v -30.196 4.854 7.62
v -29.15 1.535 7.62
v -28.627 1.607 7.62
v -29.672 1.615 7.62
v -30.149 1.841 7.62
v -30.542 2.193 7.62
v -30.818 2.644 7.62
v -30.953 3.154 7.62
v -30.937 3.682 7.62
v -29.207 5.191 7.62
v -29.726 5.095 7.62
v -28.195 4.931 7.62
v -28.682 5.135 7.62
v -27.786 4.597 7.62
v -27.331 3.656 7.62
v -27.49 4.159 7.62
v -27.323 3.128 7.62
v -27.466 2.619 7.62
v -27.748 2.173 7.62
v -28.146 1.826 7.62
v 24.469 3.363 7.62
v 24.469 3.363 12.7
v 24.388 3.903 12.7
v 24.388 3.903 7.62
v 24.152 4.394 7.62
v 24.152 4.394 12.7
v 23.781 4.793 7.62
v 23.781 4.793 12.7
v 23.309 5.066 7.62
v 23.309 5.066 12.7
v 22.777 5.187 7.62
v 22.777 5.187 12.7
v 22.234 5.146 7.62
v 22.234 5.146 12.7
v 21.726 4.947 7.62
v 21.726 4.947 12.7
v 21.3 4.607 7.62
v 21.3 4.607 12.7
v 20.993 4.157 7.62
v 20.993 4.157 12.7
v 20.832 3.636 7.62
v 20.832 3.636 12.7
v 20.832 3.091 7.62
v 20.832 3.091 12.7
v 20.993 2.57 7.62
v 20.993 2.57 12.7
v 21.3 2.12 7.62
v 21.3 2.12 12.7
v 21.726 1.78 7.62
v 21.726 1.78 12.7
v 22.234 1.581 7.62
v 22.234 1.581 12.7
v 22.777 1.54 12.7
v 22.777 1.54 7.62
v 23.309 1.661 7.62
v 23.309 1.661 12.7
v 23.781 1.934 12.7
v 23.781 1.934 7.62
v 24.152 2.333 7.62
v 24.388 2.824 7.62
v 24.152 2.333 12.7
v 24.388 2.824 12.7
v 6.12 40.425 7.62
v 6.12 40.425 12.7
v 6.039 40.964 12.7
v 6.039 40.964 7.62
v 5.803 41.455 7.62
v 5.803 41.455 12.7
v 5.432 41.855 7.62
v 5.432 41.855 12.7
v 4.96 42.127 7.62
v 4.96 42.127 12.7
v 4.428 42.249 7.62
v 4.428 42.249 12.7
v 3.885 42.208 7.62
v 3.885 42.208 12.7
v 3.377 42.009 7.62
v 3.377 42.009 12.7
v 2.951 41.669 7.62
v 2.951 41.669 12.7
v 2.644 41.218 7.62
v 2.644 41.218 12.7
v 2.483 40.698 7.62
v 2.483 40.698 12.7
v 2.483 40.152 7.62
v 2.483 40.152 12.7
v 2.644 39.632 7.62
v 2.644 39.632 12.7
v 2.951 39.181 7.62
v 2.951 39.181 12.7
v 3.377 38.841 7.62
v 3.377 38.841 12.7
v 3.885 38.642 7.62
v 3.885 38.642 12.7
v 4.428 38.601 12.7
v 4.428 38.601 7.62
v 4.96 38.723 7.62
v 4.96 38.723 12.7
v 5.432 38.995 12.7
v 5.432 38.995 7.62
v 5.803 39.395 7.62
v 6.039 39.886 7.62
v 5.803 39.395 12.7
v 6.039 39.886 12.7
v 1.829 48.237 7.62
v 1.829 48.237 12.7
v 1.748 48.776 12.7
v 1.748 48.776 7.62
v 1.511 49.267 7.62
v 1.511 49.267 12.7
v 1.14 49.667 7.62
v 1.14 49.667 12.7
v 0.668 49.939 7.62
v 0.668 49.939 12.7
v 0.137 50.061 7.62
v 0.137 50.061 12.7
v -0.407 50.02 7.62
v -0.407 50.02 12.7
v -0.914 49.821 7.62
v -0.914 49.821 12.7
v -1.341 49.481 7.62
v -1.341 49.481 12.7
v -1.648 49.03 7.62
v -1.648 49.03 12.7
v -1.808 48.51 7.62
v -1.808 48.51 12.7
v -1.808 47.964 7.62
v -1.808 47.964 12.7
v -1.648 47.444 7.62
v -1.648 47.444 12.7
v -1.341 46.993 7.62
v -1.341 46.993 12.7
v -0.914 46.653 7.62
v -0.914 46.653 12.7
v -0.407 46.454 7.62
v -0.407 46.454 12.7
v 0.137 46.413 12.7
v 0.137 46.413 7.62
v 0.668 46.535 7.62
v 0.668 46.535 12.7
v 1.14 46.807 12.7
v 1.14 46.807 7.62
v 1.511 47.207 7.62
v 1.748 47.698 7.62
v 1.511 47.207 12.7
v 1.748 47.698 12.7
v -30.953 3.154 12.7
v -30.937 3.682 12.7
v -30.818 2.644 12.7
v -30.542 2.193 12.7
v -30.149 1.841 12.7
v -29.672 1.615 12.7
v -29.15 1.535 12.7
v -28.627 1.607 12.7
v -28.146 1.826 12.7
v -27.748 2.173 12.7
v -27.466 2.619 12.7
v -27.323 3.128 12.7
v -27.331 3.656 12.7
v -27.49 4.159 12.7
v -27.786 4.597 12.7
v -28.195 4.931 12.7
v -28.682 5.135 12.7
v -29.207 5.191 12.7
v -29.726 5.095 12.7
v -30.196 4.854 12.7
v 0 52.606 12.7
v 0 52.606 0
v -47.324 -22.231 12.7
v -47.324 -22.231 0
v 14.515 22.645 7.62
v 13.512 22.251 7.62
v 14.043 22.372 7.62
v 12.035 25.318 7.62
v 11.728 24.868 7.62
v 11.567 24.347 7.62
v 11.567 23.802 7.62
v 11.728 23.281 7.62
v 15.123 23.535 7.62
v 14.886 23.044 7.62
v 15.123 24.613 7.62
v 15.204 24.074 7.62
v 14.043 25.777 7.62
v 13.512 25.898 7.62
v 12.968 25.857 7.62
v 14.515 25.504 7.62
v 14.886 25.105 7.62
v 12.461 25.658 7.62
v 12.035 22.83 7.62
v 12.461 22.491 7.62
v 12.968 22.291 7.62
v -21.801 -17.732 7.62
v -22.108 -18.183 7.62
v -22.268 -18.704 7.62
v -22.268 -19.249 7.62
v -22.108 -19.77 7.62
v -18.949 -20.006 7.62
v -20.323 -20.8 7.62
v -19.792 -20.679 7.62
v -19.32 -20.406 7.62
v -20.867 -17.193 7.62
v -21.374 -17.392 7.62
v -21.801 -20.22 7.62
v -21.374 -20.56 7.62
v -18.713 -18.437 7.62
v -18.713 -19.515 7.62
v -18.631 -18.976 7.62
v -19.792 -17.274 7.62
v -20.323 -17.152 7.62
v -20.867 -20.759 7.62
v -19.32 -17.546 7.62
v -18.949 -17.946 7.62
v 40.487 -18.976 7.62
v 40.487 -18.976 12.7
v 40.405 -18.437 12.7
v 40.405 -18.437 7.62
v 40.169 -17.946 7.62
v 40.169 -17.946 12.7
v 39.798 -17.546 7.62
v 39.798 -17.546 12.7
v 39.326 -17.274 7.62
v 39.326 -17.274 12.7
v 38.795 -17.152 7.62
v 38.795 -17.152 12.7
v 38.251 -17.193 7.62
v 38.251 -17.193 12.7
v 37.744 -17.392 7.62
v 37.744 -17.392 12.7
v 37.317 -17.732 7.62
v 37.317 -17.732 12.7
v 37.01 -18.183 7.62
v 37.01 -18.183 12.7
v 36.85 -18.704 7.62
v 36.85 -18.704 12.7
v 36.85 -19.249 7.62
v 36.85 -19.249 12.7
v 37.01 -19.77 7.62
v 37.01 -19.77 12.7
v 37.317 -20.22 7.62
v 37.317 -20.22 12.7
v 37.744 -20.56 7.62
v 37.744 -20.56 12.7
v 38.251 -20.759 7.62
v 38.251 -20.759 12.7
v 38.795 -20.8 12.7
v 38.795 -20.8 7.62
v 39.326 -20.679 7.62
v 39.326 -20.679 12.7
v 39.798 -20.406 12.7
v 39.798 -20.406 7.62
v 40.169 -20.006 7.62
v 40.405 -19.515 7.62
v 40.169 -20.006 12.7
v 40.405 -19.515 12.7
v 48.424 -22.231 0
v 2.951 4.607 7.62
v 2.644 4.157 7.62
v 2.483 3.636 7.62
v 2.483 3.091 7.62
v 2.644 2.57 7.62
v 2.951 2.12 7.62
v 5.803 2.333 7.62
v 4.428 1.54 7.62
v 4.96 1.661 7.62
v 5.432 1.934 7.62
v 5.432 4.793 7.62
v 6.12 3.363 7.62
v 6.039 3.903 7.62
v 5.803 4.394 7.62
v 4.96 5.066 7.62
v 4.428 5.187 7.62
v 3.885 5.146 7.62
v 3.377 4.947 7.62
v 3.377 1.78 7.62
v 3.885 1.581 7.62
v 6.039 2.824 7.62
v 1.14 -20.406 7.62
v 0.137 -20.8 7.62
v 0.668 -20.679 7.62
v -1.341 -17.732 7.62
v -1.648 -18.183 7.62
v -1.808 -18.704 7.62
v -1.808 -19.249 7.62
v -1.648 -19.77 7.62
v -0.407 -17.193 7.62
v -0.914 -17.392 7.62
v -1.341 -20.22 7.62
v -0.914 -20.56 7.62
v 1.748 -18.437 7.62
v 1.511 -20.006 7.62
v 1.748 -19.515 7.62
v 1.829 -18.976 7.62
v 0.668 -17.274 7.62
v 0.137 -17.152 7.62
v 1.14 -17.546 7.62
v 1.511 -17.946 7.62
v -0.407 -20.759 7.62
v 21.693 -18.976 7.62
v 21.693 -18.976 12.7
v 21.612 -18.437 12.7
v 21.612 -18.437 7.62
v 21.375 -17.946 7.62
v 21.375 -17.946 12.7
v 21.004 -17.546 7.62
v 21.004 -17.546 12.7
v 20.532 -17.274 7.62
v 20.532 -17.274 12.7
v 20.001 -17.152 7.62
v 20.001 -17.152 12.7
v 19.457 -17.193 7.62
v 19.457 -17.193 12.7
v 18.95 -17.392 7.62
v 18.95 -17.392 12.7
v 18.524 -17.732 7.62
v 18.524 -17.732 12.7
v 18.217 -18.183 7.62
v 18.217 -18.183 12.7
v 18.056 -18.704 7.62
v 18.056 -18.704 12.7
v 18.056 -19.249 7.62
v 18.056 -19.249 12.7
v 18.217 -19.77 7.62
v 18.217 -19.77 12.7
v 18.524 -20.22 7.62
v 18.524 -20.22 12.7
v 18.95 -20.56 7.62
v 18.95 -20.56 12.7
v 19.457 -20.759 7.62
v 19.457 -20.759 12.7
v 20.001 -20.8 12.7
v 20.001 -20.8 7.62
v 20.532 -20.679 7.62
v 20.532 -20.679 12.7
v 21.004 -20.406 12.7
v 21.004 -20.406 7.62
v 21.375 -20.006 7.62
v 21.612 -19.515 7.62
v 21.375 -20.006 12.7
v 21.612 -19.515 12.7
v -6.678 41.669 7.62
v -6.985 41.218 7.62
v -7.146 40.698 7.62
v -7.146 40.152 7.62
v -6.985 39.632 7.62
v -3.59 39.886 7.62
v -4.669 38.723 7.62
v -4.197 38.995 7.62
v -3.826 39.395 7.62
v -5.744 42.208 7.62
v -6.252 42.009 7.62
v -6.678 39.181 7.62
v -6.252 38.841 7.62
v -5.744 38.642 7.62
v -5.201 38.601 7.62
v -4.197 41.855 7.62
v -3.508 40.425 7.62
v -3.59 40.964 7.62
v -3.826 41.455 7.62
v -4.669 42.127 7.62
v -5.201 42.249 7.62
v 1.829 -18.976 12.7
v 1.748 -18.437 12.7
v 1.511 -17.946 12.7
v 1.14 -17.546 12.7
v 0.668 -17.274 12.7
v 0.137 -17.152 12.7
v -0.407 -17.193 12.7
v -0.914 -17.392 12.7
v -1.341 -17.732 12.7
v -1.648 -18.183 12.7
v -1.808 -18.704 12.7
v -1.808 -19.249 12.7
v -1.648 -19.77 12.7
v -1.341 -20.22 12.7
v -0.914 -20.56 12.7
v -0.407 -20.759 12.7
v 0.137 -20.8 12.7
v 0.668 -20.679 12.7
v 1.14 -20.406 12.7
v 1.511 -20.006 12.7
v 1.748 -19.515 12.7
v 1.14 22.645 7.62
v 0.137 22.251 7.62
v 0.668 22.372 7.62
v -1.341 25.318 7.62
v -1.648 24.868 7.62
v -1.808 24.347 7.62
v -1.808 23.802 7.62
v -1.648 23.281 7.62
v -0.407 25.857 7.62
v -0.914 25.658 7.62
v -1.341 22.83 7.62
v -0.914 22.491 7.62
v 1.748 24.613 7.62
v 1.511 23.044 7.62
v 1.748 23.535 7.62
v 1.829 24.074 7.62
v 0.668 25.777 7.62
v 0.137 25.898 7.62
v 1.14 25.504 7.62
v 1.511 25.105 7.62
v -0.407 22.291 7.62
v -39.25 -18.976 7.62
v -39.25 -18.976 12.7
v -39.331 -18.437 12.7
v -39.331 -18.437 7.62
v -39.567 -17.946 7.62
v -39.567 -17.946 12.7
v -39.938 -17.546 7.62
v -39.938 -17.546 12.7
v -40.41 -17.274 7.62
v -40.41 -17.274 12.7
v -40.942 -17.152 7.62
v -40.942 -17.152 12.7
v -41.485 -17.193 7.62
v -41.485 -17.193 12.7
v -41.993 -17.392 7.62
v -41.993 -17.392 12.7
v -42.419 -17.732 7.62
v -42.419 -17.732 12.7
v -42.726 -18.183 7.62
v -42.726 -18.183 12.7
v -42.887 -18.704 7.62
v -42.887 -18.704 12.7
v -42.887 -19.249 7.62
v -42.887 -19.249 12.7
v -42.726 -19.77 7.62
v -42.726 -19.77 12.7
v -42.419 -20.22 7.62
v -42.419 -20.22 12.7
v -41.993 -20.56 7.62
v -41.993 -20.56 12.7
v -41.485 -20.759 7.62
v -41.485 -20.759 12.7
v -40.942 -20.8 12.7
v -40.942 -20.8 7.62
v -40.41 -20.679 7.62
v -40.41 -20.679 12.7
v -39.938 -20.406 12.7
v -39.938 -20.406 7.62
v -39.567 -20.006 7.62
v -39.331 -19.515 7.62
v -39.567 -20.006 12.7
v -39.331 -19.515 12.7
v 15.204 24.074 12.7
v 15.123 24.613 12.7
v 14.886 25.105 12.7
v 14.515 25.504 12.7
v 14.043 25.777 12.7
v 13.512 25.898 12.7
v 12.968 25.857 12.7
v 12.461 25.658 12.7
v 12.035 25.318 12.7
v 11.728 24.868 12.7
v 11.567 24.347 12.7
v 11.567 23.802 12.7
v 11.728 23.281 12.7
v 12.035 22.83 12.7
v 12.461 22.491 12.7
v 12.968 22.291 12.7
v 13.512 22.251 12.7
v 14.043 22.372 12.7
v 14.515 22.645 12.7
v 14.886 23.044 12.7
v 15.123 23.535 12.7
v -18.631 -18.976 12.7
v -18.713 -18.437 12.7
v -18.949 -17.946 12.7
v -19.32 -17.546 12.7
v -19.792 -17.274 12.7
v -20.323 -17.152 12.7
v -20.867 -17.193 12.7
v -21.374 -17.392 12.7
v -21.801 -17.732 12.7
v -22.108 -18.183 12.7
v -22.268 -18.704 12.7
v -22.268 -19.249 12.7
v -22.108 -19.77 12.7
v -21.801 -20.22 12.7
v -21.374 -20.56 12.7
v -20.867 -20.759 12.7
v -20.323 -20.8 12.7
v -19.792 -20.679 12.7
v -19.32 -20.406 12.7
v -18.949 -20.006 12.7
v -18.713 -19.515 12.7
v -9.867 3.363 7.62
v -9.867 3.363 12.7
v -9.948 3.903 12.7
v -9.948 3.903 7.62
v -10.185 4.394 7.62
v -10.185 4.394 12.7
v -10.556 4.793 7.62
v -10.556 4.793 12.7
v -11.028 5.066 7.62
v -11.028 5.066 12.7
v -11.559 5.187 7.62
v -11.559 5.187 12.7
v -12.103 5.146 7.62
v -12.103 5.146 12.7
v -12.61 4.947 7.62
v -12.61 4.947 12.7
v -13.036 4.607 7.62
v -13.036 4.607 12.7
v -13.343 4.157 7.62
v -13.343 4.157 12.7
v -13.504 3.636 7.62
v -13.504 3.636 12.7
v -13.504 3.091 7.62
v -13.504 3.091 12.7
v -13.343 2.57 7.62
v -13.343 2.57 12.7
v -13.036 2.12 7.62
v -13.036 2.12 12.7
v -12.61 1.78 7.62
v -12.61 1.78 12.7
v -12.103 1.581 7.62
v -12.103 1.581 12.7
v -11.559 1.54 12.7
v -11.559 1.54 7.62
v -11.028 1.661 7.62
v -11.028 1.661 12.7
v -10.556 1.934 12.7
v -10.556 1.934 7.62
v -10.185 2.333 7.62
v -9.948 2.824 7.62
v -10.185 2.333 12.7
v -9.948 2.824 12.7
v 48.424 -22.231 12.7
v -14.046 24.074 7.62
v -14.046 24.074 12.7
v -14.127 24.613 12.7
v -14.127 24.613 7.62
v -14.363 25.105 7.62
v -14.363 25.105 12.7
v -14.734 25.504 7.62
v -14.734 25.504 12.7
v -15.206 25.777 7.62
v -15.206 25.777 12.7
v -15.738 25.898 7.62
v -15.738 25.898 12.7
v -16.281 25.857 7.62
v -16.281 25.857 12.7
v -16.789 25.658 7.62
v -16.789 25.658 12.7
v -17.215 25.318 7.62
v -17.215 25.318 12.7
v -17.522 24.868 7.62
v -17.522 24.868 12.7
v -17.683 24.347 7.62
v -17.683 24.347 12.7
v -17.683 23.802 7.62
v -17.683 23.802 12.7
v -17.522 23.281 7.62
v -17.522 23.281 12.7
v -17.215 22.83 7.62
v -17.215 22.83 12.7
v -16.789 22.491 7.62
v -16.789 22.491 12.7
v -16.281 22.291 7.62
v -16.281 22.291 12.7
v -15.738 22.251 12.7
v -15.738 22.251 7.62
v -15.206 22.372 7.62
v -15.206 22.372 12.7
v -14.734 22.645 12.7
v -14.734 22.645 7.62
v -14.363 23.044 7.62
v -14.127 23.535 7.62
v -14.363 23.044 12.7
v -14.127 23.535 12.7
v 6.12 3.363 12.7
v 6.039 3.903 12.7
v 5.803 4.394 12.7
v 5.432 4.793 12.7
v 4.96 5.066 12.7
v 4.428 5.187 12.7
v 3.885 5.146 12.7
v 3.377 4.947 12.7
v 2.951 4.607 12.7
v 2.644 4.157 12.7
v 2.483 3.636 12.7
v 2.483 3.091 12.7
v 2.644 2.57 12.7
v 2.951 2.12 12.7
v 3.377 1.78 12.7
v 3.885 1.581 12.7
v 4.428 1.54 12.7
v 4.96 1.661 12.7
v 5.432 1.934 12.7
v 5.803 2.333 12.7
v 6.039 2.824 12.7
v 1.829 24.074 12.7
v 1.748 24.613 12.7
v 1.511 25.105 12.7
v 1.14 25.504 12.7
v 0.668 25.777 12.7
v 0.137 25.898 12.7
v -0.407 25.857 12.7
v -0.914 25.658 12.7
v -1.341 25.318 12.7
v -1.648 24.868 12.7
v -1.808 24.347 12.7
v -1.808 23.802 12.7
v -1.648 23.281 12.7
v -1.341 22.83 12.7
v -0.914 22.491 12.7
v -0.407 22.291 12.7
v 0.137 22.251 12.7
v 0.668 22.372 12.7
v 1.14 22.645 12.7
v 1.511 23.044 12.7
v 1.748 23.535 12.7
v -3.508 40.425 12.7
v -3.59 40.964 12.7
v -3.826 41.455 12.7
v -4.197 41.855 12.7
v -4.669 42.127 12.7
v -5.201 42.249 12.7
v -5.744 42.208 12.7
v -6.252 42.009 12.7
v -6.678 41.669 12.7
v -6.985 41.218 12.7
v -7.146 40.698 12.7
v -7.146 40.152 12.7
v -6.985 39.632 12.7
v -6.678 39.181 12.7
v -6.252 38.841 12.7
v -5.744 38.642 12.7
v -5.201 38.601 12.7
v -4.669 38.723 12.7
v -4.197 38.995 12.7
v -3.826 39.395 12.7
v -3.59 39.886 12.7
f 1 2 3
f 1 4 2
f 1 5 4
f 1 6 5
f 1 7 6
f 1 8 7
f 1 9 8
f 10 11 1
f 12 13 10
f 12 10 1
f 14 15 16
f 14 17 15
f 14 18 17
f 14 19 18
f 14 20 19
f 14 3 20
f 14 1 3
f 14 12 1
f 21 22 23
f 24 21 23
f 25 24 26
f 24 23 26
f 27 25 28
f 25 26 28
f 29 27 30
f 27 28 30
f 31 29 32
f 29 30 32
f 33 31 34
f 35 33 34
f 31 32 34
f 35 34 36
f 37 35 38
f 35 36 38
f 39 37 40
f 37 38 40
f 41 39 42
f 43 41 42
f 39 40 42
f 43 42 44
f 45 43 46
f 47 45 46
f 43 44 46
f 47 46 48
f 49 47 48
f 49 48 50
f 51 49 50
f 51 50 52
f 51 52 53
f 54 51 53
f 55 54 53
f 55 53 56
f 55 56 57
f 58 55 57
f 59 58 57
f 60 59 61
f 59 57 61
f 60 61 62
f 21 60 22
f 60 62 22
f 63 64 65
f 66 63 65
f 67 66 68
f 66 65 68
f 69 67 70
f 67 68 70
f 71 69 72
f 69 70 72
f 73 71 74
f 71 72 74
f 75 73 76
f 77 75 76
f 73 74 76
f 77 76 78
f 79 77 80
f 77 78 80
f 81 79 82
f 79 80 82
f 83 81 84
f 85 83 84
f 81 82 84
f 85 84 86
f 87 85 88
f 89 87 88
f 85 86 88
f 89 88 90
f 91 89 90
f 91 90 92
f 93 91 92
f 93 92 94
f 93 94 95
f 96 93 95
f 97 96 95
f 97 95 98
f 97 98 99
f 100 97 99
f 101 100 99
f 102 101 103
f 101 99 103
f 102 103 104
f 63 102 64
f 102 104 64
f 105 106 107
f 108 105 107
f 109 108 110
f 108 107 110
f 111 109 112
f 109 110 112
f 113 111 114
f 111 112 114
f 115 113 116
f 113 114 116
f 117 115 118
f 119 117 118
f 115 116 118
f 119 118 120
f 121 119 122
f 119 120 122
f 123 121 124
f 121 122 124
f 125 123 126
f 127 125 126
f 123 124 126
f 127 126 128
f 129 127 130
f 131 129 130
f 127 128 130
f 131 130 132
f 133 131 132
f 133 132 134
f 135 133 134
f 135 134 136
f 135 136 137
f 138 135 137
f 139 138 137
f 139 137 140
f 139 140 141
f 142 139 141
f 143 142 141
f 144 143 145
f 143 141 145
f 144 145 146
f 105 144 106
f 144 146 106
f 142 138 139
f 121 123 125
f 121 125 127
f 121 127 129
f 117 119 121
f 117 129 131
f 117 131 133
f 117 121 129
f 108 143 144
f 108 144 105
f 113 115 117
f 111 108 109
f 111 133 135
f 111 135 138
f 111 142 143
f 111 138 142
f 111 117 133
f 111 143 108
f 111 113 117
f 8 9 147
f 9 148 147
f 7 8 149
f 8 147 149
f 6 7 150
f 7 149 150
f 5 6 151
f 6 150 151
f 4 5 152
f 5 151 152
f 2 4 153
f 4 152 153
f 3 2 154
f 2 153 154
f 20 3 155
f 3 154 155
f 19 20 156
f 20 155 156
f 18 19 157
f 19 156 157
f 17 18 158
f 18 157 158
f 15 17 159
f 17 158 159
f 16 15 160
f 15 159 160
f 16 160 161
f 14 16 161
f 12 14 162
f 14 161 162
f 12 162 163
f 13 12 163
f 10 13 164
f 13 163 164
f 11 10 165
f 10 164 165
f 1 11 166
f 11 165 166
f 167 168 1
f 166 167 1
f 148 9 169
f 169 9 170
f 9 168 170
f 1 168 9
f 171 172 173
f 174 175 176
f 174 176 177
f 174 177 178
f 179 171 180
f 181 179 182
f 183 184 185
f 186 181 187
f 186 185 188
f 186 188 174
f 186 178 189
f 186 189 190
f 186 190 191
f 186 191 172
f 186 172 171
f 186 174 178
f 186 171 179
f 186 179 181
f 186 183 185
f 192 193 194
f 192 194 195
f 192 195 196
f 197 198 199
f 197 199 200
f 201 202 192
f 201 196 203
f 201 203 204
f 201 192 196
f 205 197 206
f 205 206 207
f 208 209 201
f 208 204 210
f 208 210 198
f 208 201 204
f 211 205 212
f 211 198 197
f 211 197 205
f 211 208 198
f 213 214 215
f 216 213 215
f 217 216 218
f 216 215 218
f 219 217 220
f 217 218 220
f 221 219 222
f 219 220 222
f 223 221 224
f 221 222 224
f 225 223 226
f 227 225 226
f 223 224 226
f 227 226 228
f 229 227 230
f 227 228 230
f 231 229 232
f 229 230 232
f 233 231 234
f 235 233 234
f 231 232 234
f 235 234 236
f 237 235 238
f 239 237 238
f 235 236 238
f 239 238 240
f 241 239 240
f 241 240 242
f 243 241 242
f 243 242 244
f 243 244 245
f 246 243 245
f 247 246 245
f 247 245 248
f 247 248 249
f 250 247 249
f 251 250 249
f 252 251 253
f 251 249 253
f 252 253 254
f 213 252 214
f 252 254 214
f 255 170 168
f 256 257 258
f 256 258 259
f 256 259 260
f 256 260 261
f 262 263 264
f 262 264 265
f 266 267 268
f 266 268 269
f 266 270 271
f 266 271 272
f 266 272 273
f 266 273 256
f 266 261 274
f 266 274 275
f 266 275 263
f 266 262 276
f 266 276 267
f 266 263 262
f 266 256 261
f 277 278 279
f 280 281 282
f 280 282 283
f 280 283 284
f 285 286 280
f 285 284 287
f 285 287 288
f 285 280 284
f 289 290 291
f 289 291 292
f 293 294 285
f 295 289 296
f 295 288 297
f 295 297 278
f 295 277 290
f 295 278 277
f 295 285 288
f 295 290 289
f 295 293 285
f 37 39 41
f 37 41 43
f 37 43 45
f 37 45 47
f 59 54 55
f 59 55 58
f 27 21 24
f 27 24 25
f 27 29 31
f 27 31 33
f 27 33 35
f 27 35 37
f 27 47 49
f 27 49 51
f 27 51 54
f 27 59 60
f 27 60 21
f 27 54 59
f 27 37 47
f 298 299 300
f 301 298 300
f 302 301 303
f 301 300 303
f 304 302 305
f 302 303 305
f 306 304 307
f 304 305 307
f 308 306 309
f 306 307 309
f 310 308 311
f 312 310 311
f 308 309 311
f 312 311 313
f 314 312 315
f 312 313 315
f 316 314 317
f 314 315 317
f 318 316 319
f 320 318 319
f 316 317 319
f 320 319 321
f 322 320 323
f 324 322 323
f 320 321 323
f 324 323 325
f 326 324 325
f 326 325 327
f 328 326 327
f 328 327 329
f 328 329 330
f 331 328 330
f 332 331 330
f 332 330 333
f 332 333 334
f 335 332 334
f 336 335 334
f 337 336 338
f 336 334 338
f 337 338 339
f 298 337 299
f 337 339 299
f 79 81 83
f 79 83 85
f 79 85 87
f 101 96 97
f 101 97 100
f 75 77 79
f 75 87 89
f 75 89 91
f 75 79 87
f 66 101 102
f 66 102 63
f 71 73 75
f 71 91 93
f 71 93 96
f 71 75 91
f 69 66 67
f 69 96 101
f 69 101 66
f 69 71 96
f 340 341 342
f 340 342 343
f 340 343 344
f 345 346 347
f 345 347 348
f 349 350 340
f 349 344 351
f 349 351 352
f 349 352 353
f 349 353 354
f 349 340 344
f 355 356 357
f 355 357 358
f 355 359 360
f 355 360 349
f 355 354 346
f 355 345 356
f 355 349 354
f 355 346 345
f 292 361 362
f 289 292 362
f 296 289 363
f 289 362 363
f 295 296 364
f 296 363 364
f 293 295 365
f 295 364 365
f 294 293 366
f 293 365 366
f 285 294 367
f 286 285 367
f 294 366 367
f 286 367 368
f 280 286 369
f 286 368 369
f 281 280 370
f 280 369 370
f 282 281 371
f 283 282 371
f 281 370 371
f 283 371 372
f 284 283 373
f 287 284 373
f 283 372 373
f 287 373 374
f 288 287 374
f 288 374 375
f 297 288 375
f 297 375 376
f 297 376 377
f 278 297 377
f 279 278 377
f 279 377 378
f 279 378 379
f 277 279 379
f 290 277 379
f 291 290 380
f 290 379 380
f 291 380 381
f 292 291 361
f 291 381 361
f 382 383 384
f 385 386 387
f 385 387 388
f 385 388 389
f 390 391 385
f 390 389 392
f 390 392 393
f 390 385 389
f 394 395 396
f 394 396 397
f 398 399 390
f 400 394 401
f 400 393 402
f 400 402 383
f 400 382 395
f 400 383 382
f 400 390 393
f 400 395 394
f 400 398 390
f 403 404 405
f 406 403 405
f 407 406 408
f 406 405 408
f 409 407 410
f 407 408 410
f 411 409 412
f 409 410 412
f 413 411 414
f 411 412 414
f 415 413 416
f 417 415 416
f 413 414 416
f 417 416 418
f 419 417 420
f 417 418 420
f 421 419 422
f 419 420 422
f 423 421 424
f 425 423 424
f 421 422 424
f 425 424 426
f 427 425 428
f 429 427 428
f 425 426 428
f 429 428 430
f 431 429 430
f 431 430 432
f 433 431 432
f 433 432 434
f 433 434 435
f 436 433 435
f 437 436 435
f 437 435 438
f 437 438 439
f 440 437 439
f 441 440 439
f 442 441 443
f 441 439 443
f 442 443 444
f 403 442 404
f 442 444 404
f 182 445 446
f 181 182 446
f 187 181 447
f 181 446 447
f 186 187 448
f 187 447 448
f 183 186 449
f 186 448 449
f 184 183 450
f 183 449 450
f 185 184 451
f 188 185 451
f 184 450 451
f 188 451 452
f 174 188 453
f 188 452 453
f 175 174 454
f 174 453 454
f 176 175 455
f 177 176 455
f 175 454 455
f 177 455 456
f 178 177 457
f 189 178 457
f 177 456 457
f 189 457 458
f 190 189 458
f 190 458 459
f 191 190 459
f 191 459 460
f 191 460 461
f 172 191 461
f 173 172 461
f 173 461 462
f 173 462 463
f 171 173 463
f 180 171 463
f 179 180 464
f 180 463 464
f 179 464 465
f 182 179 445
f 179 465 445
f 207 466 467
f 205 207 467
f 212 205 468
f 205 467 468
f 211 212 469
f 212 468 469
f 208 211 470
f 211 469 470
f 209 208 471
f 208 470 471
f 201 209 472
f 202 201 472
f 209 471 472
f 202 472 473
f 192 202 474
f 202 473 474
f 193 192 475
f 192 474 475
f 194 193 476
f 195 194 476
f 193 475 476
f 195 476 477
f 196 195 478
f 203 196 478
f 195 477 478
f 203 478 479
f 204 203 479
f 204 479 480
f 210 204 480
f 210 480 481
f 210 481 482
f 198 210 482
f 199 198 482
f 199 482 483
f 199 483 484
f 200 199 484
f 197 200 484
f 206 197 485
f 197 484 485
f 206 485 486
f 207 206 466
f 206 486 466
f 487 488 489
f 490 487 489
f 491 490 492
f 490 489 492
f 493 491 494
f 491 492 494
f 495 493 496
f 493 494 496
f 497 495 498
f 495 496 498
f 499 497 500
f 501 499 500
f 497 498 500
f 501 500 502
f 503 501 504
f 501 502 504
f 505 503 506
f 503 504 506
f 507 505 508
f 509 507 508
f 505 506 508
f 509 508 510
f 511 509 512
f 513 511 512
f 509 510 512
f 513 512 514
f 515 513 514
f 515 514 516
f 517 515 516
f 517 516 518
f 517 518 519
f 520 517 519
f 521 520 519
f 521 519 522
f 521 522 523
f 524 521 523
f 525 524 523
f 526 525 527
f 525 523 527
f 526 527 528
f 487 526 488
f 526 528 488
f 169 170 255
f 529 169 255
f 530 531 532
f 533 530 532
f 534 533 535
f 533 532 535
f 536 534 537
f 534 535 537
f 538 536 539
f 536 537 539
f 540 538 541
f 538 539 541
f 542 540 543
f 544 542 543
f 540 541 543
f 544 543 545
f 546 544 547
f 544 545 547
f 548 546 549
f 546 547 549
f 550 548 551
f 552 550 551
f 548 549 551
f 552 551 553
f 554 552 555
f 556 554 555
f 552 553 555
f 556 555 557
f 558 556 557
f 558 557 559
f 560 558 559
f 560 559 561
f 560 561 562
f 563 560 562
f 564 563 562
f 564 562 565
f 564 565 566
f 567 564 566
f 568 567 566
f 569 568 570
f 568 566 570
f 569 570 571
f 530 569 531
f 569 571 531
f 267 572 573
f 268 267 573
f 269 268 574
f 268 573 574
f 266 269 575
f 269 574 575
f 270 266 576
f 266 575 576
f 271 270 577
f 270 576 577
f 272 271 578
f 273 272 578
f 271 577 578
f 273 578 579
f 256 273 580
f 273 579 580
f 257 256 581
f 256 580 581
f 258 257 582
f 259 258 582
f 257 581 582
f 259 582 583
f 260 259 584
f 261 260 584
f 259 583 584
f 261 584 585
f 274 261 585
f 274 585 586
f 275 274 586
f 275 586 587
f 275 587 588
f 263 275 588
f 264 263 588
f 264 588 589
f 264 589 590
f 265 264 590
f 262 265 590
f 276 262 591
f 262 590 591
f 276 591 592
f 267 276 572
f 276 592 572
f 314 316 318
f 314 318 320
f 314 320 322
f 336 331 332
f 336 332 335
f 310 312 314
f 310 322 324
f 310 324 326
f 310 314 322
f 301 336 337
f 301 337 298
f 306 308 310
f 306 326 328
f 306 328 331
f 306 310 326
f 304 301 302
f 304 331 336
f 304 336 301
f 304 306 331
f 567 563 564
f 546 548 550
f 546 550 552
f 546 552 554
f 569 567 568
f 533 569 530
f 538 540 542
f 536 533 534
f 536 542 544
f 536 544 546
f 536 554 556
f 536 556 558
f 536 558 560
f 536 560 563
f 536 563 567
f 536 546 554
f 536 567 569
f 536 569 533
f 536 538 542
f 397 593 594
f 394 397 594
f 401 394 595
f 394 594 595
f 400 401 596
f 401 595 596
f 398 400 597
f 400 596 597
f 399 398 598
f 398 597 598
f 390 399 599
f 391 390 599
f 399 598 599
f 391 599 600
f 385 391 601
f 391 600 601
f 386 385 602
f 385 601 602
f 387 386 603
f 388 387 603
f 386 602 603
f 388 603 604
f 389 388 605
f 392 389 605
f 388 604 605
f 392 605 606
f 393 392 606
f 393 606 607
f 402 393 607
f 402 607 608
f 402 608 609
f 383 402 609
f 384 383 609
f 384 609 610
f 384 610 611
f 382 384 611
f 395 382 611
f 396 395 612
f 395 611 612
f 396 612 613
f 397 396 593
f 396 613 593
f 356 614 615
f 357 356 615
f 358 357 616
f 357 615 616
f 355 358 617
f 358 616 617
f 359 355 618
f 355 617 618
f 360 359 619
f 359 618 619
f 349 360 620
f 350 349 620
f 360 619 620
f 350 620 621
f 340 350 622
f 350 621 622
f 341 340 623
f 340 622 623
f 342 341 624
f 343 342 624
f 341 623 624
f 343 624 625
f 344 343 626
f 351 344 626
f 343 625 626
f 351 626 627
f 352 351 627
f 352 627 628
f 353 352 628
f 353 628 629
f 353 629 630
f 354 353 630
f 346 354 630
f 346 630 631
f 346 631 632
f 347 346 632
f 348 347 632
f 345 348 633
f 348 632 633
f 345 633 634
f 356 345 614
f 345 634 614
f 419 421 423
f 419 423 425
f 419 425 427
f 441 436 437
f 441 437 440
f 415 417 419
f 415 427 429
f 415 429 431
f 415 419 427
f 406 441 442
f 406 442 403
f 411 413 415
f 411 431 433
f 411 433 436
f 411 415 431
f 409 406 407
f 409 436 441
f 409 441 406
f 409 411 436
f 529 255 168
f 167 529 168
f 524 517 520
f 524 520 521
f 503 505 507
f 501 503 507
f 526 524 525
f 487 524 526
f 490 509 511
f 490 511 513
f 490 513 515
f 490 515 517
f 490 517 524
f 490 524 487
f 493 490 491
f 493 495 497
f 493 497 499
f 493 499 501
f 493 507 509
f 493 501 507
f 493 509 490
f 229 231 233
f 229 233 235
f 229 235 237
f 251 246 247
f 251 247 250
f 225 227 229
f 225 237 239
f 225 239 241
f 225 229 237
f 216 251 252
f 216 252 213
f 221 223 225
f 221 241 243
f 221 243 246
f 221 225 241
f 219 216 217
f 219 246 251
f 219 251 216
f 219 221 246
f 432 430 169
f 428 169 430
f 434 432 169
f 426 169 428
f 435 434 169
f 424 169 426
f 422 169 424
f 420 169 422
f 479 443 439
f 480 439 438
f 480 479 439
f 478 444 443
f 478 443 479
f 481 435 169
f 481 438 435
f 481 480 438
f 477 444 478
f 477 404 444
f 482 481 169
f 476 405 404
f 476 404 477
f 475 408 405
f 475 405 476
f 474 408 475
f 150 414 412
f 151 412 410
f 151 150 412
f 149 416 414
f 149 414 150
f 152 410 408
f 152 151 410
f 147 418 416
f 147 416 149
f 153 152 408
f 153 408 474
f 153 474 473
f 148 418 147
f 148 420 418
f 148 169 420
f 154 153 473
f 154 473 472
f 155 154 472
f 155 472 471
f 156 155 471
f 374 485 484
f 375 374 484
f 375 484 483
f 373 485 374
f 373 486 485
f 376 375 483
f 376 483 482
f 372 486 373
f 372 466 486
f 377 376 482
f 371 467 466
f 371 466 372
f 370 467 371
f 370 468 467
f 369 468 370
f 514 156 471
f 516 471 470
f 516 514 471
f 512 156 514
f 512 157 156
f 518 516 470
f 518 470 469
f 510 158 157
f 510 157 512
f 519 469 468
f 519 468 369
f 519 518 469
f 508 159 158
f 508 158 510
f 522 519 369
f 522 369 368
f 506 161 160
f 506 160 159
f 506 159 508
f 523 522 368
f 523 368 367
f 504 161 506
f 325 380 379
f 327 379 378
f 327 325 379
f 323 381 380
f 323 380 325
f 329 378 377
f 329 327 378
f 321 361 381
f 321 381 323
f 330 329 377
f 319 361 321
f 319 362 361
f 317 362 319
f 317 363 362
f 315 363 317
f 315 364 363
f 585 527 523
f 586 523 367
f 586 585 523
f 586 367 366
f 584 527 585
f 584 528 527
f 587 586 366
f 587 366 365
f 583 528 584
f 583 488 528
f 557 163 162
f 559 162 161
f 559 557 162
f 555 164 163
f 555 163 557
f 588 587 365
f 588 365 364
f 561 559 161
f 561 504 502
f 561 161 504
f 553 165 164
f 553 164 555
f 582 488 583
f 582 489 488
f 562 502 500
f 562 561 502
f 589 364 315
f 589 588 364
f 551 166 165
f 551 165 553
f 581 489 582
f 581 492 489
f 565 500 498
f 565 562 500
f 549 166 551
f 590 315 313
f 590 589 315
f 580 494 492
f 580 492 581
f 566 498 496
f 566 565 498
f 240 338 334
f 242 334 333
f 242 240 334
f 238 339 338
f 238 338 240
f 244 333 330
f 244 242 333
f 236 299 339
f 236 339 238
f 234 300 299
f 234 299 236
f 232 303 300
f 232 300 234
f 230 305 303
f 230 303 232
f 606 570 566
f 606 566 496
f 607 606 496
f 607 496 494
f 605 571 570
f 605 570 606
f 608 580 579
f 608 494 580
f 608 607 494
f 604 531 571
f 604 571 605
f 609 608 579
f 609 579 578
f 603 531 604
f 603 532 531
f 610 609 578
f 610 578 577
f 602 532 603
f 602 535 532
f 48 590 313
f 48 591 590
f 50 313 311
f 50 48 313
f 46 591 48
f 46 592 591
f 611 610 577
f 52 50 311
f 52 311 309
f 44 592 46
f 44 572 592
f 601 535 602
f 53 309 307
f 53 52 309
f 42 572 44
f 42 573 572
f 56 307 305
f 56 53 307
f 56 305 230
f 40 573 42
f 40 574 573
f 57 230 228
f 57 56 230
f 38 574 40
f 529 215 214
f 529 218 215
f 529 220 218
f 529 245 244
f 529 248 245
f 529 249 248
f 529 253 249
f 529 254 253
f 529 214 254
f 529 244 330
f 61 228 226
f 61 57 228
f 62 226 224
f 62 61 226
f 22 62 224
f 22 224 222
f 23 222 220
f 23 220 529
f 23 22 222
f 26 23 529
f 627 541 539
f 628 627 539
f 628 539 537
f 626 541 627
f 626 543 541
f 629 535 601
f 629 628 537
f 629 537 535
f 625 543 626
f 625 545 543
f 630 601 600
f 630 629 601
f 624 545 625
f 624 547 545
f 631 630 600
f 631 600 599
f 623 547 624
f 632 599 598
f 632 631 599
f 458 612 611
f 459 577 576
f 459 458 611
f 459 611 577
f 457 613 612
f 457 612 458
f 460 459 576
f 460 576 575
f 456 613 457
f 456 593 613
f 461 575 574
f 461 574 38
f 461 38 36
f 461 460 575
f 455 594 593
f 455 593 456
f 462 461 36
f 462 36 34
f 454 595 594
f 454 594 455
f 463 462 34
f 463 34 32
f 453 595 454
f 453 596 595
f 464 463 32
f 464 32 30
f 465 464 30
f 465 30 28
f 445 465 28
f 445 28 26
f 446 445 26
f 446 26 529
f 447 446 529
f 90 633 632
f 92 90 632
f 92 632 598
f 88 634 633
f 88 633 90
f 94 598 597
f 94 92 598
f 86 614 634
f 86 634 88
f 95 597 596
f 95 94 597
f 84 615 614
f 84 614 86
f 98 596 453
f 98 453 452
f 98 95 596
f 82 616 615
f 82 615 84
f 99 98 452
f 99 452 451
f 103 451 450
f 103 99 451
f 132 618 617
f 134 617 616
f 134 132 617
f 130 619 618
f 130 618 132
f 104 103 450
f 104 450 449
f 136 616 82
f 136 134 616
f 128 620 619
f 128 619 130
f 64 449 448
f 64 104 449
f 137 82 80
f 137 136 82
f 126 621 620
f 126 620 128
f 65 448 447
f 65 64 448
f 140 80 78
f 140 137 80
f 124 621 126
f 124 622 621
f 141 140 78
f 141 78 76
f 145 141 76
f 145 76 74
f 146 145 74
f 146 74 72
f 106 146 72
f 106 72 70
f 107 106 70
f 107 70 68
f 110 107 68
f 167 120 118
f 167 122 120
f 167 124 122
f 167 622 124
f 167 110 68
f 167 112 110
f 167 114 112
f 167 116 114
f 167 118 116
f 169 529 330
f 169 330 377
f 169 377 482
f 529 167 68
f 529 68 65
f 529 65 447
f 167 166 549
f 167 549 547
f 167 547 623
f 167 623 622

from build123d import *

# Parameters (mm, degrees)
F1_DEPTH = 12.7
F2_R     = 1.8288
F3_DEPTH = 5.08


# Not quite as in the source:
# - the program builds the solid bodies; features that only make, move or delete a surface that nothing else refers to are left out


with BuildPart() as f1:
    # F0 (on Top) → F1 (new body)
    with BuildSketch(Plane.XY):
        Polygon((48.4242066741, -22.2311150283), (0, 52.6062995195), (-47.3236590624, -22.2311150283), align=None)
    extrude(amount=F1_DEPTH)

    # F2 (on face) → F3 (cut)
    with BuildSketch(Plane.XY.offset(12.7)):
        with Locations((-41.0783812404, -18.9761463553)):
            Circle(F2_R)
        with Locations((-20.4600691795, -18.9761463553)):
            Circle(F2_R)
        with Locations((0, -18.9761463553)):
            Circle(F2_R)
        with Locations((19.8642425239, -18.9761463553)):
            Circle(F2_R)
        with Locations((38.6579222977, -18.9761463553)):
            Circle(F2_R)
        with Locations((-29.1365217417, 3.3634696156)):
            Circle(F2_R)
        with Locations((-11.6957994178, 3.3634696156)):
            Circle(F2_R)
        with Locations((4.2915293016, 3.3634696156)):
            Circle(F2_R)
        with Locations((22.6406212896, 3.3634696156)):
            Circle(F2_R)
        with Locations((-15.87430574, 24.0743272007)):
            Circle(F2_R)
        with Locations((0, 24.0743272007)):
            Circle(F2_R)
        with Locations((13.3752385154, 24.0743272007)):
            Circle(F2_R)
        with Locations((-5.3372029215, 40.4250063002)):
            Circle(F2_R)
        with Locations((4.2915293016, 40.4250063002)):
            Circle(F2_R)
        with Locations((0, 48.2369959354)):
            Circle(F2_R)
    extrude(amount=-F3_DEPTH, mode=Mode.SUBTRACT)


solid = f1.part
